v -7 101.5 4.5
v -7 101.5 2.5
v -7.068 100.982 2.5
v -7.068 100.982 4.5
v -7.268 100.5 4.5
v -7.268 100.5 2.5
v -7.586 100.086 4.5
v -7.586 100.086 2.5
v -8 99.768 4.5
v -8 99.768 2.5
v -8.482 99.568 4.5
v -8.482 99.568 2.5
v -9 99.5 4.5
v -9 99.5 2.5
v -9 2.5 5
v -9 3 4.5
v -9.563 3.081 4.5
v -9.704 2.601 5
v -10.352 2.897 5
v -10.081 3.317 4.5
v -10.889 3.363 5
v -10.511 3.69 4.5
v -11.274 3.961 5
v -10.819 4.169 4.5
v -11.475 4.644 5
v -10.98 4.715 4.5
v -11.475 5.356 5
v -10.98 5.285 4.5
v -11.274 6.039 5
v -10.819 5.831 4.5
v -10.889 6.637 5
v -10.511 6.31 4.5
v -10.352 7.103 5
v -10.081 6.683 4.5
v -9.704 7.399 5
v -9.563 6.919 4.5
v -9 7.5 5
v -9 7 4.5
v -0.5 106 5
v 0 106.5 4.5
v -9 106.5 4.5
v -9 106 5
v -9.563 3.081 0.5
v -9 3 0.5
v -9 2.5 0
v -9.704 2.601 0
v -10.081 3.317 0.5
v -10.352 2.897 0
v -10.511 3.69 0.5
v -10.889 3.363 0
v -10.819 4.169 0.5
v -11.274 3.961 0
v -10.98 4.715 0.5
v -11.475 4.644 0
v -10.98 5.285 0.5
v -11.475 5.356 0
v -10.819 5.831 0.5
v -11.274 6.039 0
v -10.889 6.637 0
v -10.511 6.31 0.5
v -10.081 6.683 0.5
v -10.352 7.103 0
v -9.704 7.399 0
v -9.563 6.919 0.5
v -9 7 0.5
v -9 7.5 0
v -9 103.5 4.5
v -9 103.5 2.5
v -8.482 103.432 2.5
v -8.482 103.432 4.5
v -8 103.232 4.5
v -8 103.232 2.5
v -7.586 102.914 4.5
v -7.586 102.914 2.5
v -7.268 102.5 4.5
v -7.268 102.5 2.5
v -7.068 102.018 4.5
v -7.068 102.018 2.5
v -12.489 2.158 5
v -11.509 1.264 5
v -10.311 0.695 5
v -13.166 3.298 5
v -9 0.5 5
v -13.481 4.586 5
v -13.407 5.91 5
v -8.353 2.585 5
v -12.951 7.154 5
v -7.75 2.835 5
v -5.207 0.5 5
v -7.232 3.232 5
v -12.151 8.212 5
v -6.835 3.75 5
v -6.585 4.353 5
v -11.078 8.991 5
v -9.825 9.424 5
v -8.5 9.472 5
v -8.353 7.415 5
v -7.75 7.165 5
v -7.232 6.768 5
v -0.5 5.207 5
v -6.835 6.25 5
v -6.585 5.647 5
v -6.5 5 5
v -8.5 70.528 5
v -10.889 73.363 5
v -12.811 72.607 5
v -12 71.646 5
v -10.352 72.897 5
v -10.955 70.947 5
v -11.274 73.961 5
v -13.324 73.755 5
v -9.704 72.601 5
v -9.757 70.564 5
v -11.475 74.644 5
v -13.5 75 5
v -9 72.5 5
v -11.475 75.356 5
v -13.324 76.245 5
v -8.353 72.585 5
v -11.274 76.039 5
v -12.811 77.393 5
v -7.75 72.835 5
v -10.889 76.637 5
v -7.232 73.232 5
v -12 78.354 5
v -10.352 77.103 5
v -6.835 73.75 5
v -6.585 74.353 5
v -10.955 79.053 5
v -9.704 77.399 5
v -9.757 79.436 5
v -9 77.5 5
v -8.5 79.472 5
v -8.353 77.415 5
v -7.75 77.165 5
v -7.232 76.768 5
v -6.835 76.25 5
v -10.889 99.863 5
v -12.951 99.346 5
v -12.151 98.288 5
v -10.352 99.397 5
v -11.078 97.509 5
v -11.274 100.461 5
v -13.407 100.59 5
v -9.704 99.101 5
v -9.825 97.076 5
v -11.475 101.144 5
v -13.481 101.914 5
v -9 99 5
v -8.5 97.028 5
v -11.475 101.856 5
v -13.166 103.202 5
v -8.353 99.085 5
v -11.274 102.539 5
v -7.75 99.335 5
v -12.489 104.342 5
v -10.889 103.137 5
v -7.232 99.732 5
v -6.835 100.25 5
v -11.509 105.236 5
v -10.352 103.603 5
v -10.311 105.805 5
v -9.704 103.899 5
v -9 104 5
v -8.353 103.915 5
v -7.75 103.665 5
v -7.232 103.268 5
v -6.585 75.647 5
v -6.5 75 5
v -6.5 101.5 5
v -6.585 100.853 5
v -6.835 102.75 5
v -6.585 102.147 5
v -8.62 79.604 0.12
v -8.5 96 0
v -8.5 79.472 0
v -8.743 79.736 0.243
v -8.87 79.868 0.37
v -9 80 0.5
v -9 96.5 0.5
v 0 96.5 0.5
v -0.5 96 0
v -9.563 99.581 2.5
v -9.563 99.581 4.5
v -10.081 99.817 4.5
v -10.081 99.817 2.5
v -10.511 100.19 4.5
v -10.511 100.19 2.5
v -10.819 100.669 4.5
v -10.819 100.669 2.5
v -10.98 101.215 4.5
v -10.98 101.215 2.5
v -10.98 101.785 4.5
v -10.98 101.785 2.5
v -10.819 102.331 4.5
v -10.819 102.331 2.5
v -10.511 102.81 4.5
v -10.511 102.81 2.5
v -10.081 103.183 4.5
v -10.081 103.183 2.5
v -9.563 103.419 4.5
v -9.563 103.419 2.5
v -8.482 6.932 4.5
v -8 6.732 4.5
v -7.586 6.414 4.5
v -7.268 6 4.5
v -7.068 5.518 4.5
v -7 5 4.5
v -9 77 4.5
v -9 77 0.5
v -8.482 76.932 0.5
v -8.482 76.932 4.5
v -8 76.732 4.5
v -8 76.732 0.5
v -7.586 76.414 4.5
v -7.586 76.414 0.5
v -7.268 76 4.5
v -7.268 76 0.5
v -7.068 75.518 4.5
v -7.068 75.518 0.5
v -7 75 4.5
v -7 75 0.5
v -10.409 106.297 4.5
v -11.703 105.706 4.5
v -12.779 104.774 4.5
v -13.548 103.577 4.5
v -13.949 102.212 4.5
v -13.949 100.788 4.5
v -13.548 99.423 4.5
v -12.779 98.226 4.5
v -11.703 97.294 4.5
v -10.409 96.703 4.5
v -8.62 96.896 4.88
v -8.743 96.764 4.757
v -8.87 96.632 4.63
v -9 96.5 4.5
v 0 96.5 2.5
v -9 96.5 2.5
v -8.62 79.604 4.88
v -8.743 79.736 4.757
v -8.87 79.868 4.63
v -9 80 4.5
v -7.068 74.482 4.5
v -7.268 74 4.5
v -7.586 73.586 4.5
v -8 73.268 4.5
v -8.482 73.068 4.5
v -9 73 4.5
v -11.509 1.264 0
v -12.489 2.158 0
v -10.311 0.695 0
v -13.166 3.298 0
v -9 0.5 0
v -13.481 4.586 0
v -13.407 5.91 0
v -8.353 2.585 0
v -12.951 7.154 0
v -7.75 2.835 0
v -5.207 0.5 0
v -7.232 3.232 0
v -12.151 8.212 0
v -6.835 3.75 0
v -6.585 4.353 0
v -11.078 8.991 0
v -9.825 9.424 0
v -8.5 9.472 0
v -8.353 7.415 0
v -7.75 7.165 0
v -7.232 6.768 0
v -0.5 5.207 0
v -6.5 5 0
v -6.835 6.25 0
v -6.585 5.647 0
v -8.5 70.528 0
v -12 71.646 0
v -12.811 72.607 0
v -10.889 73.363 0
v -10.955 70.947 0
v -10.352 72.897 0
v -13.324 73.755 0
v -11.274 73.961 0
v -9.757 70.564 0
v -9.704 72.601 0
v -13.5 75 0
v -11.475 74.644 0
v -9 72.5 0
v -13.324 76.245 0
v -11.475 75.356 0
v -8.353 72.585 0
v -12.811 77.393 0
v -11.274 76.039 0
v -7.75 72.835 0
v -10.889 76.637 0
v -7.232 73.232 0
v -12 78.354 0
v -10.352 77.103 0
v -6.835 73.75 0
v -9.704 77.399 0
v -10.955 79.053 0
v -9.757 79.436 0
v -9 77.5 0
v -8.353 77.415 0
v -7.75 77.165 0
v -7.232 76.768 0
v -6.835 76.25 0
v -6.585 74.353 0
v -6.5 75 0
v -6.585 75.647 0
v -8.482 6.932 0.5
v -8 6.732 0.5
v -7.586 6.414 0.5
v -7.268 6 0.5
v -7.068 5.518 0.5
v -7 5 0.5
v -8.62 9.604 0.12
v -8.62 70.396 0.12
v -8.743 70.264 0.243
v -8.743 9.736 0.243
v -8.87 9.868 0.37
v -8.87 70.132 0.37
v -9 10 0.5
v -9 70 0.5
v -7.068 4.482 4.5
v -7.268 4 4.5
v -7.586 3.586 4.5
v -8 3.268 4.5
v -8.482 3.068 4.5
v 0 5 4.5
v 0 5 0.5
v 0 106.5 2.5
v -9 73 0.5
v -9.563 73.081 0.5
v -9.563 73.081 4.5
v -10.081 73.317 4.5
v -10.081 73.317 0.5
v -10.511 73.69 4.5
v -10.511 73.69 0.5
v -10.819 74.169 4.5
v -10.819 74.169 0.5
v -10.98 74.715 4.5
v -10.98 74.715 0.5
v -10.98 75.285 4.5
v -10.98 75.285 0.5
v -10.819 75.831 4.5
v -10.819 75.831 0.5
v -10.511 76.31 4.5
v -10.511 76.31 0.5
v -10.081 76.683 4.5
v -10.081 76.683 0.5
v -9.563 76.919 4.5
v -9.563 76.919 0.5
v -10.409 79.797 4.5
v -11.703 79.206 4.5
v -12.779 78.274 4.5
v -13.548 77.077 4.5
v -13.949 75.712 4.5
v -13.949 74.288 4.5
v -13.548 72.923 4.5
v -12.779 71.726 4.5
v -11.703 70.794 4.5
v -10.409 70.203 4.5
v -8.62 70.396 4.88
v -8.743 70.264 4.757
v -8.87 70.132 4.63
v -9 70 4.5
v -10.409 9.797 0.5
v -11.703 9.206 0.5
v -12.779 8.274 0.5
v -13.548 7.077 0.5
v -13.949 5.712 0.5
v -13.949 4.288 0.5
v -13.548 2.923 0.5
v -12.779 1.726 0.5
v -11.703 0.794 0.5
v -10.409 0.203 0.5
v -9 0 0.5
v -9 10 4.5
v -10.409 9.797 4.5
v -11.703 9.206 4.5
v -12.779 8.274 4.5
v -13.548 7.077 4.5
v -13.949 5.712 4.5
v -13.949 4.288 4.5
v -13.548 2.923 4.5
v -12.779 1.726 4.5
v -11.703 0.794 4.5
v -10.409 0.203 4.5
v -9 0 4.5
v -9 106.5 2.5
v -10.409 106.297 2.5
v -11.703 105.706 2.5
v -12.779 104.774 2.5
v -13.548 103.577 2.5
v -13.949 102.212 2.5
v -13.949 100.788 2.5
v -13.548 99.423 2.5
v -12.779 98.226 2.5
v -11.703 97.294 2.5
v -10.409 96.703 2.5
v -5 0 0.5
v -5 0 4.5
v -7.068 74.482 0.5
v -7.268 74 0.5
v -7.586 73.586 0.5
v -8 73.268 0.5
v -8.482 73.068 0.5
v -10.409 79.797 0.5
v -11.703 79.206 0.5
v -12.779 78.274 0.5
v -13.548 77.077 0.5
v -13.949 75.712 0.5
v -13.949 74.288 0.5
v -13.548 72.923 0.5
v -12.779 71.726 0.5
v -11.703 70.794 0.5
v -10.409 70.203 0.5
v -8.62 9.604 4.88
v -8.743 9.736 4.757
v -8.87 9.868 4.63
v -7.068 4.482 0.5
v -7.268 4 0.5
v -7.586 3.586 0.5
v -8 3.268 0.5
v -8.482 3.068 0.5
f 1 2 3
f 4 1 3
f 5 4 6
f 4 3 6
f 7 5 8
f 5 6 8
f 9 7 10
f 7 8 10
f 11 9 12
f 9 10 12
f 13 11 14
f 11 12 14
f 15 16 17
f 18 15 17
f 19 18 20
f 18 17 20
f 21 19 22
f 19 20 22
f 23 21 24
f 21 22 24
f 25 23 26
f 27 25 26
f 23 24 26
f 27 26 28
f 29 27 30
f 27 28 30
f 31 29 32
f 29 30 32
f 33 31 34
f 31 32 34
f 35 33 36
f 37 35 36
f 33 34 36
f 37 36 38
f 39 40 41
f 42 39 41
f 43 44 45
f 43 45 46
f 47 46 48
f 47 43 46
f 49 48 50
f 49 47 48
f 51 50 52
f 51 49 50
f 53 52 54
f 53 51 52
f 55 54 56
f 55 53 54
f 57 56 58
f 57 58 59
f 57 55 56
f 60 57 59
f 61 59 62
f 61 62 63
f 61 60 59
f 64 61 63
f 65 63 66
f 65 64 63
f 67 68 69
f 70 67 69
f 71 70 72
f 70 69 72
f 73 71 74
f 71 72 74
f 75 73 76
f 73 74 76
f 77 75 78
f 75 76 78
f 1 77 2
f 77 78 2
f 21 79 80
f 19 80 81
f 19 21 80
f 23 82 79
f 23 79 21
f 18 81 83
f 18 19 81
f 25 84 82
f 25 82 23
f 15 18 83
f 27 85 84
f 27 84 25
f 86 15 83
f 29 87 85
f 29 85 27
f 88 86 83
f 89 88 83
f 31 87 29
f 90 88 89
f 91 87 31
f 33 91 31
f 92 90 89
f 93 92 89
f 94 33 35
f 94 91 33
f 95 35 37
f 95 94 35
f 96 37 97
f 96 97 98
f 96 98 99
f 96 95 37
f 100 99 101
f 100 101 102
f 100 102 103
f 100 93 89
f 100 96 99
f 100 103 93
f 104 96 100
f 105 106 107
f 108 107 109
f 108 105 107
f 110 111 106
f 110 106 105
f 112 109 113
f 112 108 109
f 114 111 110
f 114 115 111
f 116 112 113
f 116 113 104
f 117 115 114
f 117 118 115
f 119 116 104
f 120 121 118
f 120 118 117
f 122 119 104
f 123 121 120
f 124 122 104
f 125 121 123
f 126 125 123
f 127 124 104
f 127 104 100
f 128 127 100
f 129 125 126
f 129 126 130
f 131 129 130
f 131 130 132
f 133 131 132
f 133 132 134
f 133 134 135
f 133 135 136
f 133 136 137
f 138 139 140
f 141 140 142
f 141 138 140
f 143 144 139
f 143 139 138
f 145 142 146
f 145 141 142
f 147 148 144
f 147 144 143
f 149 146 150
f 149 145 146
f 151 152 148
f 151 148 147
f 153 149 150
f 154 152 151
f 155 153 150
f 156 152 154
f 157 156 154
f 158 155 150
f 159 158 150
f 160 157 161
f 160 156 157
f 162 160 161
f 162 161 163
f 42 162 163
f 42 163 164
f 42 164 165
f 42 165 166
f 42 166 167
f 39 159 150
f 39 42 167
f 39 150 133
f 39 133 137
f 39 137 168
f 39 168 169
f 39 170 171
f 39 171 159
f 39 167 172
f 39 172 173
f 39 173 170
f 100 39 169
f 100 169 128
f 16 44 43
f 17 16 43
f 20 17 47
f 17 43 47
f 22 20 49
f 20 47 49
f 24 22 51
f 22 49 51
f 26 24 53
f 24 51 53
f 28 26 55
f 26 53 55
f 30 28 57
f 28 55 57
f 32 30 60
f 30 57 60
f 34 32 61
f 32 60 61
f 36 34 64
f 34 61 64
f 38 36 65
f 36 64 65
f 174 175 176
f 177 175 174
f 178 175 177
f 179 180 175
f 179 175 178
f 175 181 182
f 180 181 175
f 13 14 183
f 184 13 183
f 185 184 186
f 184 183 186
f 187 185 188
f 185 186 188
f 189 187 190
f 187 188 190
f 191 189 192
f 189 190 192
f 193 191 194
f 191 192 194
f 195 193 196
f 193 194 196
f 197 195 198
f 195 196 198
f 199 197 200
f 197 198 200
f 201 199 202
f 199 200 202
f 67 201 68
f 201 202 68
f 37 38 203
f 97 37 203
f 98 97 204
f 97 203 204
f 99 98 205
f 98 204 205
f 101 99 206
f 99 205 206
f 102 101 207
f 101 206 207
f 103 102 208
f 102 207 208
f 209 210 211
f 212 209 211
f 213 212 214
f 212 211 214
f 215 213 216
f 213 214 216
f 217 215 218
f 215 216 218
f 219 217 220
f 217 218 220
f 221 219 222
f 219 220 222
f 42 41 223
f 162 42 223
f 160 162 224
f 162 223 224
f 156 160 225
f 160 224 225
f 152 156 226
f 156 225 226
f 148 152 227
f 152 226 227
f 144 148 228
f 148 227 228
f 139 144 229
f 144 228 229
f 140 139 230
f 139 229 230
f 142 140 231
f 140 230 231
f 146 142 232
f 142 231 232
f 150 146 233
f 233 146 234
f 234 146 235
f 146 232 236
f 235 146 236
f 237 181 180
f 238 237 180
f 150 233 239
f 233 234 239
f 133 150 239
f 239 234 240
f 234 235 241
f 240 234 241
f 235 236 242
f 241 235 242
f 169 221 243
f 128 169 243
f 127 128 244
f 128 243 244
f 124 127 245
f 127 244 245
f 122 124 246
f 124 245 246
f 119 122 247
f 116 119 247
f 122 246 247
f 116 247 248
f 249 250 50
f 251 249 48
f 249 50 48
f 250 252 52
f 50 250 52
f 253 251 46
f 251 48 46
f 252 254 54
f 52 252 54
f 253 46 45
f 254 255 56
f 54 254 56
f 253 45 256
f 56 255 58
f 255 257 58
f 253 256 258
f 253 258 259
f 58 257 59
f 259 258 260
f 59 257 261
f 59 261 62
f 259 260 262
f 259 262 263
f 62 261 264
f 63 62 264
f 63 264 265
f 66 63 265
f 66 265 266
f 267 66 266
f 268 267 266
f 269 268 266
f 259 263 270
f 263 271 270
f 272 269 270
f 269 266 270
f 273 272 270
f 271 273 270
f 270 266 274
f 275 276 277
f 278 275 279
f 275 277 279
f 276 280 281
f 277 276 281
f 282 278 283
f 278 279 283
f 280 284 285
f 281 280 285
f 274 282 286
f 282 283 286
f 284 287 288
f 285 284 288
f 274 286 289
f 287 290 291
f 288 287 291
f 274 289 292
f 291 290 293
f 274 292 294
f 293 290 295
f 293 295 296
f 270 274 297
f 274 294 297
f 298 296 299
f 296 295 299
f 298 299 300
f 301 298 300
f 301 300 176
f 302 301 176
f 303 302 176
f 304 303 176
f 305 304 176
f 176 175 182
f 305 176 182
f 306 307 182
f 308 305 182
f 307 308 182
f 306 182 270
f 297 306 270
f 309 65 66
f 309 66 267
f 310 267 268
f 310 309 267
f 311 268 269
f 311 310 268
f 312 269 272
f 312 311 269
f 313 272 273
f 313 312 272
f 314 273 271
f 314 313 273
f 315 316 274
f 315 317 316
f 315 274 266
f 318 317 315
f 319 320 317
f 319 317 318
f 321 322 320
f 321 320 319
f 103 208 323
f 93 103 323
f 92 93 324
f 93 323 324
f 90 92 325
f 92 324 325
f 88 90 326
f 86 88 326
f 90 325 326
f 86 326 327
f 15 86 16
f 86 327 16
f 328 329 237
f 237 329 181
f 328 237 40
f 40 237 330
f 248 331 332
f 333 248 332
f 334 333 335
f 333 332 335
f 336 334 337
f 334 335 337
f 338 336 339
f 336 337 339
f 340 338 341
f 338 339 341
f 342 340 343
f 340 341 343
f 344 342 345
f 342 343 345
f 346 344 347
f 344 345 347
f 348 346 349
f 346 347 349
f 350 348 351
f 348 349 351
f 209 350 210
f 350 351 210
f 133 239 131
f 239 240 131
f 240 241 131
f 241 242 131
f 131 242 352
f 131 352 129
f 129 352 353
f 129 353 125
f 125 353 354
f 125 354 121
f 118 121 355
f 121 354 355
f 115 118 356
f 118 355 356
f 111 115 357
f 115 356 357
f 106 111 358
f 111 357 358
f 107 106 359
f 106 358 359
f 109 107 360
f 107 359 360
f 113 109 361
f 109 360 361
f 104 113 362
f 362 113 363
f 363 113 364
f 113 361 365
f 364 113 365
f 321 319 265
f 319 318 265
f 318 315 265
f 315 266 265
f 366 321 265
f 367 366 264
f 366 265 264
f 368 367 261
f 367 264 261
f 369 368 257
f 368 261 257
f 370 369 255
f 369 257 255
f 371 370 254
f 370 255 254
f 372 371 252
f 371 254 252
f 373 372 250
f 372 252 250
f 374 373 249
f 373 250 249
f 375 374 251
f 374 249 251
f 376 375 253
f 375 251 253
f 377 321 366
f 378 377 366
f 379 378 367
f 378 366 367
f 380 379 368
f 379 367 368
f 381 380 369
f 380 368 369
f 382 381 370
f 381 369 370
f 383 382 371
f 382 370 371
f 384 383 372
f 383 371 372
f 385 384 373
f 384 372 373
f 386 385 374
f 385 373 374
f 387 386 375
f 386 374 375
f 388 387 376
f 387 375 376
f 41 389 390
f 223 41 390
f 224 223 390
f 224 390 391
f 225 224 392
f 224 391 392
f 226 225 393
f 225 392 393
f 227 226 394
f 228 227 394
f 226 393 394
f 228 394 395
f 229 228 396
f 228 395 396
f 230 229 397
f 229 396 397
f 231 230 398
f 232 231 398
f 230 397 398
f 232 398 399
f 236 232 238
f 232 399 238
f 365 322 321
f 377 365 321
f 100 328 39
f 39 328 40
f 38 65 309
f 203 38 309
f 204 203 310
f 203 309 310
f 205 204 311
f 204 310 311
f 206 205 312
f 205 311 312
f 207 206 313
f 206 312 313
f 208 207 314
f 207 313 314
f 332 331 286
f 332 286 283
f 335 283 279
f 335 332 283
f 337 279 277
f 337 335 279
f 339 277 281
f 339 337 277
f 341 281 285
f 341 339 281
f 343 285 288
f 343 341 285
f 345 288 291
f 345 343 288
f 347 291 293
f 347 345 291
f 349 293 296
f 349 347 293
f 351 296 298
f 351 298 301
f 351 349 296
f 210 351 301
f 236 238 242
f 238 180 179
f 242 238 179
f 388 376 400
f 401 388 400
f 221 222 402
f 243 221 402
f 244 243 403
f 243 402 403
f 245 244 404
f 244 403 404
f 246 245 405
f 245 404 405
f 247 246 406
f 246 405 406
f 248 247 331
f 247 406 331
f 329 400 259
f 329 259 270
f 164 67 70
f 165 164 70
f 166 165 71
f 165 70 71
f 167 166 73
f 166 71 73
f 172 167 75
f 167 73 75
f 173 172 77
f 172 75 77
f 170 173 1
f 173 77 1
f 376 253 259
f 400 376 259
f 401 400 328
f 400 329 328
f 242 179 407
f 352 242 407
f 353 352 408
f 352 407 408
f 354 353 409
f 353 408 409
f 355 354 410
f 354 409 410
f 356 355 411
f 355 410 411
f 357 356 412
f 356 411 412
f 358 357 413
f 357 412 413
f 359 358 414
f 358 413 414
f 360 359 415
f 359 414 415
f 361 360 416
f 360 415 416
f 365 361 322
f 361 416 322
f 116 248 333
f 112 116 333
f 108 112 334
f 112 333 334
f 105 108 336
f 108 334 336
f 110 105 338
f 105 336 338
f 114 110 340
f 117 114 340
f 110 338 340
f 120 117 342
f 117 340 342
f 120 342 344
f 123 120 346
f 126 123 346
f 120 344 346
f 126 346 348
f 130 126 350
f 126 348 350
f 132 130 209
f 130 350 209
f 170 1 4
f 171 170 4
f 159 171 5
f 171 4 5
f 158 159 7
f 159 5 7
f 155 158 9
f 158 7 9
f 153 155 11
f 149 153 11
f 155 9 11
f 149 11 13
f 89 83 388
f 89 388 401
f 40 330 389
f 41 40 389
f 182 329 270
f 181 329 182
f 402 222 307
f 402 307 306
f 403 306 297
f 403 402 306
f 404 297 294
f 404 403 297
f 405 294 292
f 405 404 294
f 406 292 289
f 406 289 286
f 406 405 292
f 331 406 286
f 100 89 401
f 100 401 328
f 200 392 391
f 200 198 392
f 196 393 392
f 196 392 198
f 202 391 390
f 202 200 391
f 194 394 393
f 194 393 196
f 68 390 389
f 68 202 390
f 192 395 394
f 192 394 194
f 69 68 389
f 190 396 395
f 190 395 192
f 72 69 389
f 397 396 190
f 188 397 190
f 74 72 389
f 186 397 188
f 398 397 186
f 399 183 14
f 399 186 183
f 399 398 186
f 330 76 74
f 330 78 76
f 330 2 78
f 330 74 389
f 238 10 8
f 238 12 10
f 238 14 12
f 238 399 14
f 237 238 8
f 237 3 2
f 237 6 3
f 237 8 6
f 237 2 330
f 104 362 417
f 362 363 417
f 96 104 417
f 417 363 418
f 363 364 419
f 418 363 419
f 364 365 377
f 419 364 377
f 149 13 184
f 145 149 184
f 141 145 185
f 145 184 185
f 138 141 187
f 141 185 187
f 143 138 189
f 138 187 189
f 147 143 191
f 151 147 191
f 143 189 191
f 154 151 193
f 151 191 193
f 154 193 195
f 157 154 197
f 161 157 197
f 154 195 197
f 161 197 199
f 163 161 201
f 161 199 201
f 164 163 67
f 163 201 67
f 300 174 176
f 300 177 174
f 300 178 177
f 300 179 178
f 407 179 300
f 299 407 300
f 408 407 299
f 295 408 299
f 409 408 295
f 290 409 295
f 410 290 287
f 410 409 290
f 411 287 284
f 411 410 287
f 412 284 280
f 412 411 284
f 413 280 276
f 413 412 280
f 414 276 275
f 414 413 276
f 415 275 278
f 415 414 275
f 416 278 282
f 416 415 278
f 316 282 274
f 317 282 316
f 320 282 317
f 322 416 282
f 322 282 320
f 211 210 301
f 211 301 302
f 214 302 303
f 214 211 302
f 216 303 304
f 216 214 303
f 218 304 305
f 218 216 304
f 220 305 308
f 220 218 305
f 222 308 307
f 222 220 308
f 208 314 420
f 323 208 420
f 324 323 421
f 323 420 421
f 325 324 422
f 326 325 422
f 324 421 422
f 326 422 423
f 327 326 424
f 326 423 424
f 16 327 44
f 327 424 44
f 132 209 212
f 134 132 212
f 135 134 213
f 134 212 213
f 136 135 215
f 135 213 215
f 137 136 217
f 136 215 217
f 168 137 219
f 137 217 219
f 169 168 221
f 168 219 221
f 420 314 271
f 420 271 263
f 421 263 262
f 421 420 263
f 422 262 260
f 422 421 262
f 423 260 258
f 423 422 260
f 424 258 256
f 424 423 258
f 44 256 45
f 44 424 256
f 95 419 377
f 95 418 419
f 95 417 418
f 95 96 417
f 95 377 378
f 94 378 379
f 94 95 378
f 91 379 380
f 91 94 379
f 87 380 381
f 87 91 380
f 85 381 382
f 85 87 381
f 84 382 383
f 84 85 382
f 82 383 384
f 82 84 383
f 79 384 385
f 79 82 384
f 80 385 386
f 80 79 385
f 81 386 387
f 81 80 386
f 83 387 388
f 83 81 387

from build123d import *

# Parameters (mm, degrees)
F1_DEPTH = 5
F3_DEPTH = 2.5
F4_SIZE  = 5
F5_SIZE  = 0.5


with BuildPart() as f1:
    # F0 (on Top) → F1 (new body)
    with BuildSketch(Plane.XY):
        with BuildLine():
            Line((-9, 0), (0, 0))
            Line((0, 0), (0, 106.5))
            Line((0, 106.5), (-9, 106.5))
            Line((-9, 106.5), (-9, 103.5))
            ThreePointArc((-9, 103.5), (-7.585786, 102.914214), (-7, 101.5))
            ThreePointArc((-7, 101.5), (-7.585786, 100.085786), (-9, 99.5))
            Line((-9, 99.5), (-9, 96.5))
            Line((-9, 96.5), (-9, 80))
            Line((-9, 80), (-9, 77))
            ThreePointArc((-9, 77), (-7.585786, 76.414214), (-7, 75))
            ThreePointArc((-7, 75), (-7.585786, 73.585786), (-9, 73))
            Line((-9, 73), (-9, 70))
            Line((-9, 70), (-9, 10))
            Line((-9, 10), (-9, 7))
            ThreePointArc((-9, 7), (-7.585786, 6.414214), (-7, 5))
            ThreePointArc((-7, 5), (-7.585786, 3.585786), (-9, 3))
            Line((-9, 3), (-9, 0))
        make_face()
        with BuildLine():
            ThreePointArc((-9, 10), (-14, 5), (-9, 0))
            Line((-9, 0), (-9, 3))
            ThreePointArc((-9, 3), (-11, 5), (-9, 7))
            Line((-9, 7), (-9, 10))
        make_face()
        with BuildLine():
            Line((-9, 103.5), (-9, 106.5))
            ThreePointArc((-9, 106.5), (-14, 101.5), (-9, 96.5))
            Line((-9, 96.5), (-9, 99.5))
            ThreePointArc((-9, 99.5), (-11, 101.5), (-9, 103.5))
        make_face()
        with BuildLine():
            ThreePointArc((-9, 80), (-14, 75), (-9, 70))
            Line((-9, 70), (-9, 73))
            ThreePointArc((-9, 73), (-11, 75), (-9, 77))
            Line((-9, 77), (-9, 80))
        make_face()
    extrude(amount=F1_DEPTH)

    # F2 (on face) → F3 (cut)
    with BuildSketch(Plane(origin=(0, 0, 0), x_dir=(1, 0, 0), z_dir=(0, 0, -1))):
        with BuildLine():
            Line((0, -96.5), (-9, -96.5))
            ThreePointArc((-9, -96.5), (-14, -101.5), (-9, -106.5))
            Line((-9, -106.5), (0, -106.5))
            Line((0, -106.5), (0, -96.5))
        make_face()
    extrude(amount=-F3_DEPTH, mode=Mode.SUBTRACT)

    # F4
    f4_edges = [f1.edges().sort_by_distance(p)[0] for p in [
        (0, 0, 2.5),
    ]]
    chamfer(f4_edges, length=F4_SIZE)

    # F5
    f5_edges = [f1.edges().sort_by_distance(p)[0] for p in [
        (-7, 0, 5),
        (-2.5, 2.5, 5),
        (-14, 5, 5),
        (0, 55.75, 5),
        (-9, 40, 5),
        (-4.5, 106.5, 5),
        (-14, 75, 5),
        (-14, 101.5, 5),
        (-9, 88.25, 5),
        (-9, 73, 5),
        (-9, 99.5, 5),
        (-9, 3, 5),
        (0, 50.75, 0),
        (-2.5, 2.5, 0),
        (-4.5, 96.5, 0),
        (-7, 0, 0),
        (-9, 88.25, 0),
        (-14, 5, 0),
        (-14, 75, 0),
        (-9, 40, 0),
        (-9, 3, 0),
        (-9, 73, 0),
    ]]
    chamfer(f5_edges, length=F5_SIZE)


solid = f1.part
